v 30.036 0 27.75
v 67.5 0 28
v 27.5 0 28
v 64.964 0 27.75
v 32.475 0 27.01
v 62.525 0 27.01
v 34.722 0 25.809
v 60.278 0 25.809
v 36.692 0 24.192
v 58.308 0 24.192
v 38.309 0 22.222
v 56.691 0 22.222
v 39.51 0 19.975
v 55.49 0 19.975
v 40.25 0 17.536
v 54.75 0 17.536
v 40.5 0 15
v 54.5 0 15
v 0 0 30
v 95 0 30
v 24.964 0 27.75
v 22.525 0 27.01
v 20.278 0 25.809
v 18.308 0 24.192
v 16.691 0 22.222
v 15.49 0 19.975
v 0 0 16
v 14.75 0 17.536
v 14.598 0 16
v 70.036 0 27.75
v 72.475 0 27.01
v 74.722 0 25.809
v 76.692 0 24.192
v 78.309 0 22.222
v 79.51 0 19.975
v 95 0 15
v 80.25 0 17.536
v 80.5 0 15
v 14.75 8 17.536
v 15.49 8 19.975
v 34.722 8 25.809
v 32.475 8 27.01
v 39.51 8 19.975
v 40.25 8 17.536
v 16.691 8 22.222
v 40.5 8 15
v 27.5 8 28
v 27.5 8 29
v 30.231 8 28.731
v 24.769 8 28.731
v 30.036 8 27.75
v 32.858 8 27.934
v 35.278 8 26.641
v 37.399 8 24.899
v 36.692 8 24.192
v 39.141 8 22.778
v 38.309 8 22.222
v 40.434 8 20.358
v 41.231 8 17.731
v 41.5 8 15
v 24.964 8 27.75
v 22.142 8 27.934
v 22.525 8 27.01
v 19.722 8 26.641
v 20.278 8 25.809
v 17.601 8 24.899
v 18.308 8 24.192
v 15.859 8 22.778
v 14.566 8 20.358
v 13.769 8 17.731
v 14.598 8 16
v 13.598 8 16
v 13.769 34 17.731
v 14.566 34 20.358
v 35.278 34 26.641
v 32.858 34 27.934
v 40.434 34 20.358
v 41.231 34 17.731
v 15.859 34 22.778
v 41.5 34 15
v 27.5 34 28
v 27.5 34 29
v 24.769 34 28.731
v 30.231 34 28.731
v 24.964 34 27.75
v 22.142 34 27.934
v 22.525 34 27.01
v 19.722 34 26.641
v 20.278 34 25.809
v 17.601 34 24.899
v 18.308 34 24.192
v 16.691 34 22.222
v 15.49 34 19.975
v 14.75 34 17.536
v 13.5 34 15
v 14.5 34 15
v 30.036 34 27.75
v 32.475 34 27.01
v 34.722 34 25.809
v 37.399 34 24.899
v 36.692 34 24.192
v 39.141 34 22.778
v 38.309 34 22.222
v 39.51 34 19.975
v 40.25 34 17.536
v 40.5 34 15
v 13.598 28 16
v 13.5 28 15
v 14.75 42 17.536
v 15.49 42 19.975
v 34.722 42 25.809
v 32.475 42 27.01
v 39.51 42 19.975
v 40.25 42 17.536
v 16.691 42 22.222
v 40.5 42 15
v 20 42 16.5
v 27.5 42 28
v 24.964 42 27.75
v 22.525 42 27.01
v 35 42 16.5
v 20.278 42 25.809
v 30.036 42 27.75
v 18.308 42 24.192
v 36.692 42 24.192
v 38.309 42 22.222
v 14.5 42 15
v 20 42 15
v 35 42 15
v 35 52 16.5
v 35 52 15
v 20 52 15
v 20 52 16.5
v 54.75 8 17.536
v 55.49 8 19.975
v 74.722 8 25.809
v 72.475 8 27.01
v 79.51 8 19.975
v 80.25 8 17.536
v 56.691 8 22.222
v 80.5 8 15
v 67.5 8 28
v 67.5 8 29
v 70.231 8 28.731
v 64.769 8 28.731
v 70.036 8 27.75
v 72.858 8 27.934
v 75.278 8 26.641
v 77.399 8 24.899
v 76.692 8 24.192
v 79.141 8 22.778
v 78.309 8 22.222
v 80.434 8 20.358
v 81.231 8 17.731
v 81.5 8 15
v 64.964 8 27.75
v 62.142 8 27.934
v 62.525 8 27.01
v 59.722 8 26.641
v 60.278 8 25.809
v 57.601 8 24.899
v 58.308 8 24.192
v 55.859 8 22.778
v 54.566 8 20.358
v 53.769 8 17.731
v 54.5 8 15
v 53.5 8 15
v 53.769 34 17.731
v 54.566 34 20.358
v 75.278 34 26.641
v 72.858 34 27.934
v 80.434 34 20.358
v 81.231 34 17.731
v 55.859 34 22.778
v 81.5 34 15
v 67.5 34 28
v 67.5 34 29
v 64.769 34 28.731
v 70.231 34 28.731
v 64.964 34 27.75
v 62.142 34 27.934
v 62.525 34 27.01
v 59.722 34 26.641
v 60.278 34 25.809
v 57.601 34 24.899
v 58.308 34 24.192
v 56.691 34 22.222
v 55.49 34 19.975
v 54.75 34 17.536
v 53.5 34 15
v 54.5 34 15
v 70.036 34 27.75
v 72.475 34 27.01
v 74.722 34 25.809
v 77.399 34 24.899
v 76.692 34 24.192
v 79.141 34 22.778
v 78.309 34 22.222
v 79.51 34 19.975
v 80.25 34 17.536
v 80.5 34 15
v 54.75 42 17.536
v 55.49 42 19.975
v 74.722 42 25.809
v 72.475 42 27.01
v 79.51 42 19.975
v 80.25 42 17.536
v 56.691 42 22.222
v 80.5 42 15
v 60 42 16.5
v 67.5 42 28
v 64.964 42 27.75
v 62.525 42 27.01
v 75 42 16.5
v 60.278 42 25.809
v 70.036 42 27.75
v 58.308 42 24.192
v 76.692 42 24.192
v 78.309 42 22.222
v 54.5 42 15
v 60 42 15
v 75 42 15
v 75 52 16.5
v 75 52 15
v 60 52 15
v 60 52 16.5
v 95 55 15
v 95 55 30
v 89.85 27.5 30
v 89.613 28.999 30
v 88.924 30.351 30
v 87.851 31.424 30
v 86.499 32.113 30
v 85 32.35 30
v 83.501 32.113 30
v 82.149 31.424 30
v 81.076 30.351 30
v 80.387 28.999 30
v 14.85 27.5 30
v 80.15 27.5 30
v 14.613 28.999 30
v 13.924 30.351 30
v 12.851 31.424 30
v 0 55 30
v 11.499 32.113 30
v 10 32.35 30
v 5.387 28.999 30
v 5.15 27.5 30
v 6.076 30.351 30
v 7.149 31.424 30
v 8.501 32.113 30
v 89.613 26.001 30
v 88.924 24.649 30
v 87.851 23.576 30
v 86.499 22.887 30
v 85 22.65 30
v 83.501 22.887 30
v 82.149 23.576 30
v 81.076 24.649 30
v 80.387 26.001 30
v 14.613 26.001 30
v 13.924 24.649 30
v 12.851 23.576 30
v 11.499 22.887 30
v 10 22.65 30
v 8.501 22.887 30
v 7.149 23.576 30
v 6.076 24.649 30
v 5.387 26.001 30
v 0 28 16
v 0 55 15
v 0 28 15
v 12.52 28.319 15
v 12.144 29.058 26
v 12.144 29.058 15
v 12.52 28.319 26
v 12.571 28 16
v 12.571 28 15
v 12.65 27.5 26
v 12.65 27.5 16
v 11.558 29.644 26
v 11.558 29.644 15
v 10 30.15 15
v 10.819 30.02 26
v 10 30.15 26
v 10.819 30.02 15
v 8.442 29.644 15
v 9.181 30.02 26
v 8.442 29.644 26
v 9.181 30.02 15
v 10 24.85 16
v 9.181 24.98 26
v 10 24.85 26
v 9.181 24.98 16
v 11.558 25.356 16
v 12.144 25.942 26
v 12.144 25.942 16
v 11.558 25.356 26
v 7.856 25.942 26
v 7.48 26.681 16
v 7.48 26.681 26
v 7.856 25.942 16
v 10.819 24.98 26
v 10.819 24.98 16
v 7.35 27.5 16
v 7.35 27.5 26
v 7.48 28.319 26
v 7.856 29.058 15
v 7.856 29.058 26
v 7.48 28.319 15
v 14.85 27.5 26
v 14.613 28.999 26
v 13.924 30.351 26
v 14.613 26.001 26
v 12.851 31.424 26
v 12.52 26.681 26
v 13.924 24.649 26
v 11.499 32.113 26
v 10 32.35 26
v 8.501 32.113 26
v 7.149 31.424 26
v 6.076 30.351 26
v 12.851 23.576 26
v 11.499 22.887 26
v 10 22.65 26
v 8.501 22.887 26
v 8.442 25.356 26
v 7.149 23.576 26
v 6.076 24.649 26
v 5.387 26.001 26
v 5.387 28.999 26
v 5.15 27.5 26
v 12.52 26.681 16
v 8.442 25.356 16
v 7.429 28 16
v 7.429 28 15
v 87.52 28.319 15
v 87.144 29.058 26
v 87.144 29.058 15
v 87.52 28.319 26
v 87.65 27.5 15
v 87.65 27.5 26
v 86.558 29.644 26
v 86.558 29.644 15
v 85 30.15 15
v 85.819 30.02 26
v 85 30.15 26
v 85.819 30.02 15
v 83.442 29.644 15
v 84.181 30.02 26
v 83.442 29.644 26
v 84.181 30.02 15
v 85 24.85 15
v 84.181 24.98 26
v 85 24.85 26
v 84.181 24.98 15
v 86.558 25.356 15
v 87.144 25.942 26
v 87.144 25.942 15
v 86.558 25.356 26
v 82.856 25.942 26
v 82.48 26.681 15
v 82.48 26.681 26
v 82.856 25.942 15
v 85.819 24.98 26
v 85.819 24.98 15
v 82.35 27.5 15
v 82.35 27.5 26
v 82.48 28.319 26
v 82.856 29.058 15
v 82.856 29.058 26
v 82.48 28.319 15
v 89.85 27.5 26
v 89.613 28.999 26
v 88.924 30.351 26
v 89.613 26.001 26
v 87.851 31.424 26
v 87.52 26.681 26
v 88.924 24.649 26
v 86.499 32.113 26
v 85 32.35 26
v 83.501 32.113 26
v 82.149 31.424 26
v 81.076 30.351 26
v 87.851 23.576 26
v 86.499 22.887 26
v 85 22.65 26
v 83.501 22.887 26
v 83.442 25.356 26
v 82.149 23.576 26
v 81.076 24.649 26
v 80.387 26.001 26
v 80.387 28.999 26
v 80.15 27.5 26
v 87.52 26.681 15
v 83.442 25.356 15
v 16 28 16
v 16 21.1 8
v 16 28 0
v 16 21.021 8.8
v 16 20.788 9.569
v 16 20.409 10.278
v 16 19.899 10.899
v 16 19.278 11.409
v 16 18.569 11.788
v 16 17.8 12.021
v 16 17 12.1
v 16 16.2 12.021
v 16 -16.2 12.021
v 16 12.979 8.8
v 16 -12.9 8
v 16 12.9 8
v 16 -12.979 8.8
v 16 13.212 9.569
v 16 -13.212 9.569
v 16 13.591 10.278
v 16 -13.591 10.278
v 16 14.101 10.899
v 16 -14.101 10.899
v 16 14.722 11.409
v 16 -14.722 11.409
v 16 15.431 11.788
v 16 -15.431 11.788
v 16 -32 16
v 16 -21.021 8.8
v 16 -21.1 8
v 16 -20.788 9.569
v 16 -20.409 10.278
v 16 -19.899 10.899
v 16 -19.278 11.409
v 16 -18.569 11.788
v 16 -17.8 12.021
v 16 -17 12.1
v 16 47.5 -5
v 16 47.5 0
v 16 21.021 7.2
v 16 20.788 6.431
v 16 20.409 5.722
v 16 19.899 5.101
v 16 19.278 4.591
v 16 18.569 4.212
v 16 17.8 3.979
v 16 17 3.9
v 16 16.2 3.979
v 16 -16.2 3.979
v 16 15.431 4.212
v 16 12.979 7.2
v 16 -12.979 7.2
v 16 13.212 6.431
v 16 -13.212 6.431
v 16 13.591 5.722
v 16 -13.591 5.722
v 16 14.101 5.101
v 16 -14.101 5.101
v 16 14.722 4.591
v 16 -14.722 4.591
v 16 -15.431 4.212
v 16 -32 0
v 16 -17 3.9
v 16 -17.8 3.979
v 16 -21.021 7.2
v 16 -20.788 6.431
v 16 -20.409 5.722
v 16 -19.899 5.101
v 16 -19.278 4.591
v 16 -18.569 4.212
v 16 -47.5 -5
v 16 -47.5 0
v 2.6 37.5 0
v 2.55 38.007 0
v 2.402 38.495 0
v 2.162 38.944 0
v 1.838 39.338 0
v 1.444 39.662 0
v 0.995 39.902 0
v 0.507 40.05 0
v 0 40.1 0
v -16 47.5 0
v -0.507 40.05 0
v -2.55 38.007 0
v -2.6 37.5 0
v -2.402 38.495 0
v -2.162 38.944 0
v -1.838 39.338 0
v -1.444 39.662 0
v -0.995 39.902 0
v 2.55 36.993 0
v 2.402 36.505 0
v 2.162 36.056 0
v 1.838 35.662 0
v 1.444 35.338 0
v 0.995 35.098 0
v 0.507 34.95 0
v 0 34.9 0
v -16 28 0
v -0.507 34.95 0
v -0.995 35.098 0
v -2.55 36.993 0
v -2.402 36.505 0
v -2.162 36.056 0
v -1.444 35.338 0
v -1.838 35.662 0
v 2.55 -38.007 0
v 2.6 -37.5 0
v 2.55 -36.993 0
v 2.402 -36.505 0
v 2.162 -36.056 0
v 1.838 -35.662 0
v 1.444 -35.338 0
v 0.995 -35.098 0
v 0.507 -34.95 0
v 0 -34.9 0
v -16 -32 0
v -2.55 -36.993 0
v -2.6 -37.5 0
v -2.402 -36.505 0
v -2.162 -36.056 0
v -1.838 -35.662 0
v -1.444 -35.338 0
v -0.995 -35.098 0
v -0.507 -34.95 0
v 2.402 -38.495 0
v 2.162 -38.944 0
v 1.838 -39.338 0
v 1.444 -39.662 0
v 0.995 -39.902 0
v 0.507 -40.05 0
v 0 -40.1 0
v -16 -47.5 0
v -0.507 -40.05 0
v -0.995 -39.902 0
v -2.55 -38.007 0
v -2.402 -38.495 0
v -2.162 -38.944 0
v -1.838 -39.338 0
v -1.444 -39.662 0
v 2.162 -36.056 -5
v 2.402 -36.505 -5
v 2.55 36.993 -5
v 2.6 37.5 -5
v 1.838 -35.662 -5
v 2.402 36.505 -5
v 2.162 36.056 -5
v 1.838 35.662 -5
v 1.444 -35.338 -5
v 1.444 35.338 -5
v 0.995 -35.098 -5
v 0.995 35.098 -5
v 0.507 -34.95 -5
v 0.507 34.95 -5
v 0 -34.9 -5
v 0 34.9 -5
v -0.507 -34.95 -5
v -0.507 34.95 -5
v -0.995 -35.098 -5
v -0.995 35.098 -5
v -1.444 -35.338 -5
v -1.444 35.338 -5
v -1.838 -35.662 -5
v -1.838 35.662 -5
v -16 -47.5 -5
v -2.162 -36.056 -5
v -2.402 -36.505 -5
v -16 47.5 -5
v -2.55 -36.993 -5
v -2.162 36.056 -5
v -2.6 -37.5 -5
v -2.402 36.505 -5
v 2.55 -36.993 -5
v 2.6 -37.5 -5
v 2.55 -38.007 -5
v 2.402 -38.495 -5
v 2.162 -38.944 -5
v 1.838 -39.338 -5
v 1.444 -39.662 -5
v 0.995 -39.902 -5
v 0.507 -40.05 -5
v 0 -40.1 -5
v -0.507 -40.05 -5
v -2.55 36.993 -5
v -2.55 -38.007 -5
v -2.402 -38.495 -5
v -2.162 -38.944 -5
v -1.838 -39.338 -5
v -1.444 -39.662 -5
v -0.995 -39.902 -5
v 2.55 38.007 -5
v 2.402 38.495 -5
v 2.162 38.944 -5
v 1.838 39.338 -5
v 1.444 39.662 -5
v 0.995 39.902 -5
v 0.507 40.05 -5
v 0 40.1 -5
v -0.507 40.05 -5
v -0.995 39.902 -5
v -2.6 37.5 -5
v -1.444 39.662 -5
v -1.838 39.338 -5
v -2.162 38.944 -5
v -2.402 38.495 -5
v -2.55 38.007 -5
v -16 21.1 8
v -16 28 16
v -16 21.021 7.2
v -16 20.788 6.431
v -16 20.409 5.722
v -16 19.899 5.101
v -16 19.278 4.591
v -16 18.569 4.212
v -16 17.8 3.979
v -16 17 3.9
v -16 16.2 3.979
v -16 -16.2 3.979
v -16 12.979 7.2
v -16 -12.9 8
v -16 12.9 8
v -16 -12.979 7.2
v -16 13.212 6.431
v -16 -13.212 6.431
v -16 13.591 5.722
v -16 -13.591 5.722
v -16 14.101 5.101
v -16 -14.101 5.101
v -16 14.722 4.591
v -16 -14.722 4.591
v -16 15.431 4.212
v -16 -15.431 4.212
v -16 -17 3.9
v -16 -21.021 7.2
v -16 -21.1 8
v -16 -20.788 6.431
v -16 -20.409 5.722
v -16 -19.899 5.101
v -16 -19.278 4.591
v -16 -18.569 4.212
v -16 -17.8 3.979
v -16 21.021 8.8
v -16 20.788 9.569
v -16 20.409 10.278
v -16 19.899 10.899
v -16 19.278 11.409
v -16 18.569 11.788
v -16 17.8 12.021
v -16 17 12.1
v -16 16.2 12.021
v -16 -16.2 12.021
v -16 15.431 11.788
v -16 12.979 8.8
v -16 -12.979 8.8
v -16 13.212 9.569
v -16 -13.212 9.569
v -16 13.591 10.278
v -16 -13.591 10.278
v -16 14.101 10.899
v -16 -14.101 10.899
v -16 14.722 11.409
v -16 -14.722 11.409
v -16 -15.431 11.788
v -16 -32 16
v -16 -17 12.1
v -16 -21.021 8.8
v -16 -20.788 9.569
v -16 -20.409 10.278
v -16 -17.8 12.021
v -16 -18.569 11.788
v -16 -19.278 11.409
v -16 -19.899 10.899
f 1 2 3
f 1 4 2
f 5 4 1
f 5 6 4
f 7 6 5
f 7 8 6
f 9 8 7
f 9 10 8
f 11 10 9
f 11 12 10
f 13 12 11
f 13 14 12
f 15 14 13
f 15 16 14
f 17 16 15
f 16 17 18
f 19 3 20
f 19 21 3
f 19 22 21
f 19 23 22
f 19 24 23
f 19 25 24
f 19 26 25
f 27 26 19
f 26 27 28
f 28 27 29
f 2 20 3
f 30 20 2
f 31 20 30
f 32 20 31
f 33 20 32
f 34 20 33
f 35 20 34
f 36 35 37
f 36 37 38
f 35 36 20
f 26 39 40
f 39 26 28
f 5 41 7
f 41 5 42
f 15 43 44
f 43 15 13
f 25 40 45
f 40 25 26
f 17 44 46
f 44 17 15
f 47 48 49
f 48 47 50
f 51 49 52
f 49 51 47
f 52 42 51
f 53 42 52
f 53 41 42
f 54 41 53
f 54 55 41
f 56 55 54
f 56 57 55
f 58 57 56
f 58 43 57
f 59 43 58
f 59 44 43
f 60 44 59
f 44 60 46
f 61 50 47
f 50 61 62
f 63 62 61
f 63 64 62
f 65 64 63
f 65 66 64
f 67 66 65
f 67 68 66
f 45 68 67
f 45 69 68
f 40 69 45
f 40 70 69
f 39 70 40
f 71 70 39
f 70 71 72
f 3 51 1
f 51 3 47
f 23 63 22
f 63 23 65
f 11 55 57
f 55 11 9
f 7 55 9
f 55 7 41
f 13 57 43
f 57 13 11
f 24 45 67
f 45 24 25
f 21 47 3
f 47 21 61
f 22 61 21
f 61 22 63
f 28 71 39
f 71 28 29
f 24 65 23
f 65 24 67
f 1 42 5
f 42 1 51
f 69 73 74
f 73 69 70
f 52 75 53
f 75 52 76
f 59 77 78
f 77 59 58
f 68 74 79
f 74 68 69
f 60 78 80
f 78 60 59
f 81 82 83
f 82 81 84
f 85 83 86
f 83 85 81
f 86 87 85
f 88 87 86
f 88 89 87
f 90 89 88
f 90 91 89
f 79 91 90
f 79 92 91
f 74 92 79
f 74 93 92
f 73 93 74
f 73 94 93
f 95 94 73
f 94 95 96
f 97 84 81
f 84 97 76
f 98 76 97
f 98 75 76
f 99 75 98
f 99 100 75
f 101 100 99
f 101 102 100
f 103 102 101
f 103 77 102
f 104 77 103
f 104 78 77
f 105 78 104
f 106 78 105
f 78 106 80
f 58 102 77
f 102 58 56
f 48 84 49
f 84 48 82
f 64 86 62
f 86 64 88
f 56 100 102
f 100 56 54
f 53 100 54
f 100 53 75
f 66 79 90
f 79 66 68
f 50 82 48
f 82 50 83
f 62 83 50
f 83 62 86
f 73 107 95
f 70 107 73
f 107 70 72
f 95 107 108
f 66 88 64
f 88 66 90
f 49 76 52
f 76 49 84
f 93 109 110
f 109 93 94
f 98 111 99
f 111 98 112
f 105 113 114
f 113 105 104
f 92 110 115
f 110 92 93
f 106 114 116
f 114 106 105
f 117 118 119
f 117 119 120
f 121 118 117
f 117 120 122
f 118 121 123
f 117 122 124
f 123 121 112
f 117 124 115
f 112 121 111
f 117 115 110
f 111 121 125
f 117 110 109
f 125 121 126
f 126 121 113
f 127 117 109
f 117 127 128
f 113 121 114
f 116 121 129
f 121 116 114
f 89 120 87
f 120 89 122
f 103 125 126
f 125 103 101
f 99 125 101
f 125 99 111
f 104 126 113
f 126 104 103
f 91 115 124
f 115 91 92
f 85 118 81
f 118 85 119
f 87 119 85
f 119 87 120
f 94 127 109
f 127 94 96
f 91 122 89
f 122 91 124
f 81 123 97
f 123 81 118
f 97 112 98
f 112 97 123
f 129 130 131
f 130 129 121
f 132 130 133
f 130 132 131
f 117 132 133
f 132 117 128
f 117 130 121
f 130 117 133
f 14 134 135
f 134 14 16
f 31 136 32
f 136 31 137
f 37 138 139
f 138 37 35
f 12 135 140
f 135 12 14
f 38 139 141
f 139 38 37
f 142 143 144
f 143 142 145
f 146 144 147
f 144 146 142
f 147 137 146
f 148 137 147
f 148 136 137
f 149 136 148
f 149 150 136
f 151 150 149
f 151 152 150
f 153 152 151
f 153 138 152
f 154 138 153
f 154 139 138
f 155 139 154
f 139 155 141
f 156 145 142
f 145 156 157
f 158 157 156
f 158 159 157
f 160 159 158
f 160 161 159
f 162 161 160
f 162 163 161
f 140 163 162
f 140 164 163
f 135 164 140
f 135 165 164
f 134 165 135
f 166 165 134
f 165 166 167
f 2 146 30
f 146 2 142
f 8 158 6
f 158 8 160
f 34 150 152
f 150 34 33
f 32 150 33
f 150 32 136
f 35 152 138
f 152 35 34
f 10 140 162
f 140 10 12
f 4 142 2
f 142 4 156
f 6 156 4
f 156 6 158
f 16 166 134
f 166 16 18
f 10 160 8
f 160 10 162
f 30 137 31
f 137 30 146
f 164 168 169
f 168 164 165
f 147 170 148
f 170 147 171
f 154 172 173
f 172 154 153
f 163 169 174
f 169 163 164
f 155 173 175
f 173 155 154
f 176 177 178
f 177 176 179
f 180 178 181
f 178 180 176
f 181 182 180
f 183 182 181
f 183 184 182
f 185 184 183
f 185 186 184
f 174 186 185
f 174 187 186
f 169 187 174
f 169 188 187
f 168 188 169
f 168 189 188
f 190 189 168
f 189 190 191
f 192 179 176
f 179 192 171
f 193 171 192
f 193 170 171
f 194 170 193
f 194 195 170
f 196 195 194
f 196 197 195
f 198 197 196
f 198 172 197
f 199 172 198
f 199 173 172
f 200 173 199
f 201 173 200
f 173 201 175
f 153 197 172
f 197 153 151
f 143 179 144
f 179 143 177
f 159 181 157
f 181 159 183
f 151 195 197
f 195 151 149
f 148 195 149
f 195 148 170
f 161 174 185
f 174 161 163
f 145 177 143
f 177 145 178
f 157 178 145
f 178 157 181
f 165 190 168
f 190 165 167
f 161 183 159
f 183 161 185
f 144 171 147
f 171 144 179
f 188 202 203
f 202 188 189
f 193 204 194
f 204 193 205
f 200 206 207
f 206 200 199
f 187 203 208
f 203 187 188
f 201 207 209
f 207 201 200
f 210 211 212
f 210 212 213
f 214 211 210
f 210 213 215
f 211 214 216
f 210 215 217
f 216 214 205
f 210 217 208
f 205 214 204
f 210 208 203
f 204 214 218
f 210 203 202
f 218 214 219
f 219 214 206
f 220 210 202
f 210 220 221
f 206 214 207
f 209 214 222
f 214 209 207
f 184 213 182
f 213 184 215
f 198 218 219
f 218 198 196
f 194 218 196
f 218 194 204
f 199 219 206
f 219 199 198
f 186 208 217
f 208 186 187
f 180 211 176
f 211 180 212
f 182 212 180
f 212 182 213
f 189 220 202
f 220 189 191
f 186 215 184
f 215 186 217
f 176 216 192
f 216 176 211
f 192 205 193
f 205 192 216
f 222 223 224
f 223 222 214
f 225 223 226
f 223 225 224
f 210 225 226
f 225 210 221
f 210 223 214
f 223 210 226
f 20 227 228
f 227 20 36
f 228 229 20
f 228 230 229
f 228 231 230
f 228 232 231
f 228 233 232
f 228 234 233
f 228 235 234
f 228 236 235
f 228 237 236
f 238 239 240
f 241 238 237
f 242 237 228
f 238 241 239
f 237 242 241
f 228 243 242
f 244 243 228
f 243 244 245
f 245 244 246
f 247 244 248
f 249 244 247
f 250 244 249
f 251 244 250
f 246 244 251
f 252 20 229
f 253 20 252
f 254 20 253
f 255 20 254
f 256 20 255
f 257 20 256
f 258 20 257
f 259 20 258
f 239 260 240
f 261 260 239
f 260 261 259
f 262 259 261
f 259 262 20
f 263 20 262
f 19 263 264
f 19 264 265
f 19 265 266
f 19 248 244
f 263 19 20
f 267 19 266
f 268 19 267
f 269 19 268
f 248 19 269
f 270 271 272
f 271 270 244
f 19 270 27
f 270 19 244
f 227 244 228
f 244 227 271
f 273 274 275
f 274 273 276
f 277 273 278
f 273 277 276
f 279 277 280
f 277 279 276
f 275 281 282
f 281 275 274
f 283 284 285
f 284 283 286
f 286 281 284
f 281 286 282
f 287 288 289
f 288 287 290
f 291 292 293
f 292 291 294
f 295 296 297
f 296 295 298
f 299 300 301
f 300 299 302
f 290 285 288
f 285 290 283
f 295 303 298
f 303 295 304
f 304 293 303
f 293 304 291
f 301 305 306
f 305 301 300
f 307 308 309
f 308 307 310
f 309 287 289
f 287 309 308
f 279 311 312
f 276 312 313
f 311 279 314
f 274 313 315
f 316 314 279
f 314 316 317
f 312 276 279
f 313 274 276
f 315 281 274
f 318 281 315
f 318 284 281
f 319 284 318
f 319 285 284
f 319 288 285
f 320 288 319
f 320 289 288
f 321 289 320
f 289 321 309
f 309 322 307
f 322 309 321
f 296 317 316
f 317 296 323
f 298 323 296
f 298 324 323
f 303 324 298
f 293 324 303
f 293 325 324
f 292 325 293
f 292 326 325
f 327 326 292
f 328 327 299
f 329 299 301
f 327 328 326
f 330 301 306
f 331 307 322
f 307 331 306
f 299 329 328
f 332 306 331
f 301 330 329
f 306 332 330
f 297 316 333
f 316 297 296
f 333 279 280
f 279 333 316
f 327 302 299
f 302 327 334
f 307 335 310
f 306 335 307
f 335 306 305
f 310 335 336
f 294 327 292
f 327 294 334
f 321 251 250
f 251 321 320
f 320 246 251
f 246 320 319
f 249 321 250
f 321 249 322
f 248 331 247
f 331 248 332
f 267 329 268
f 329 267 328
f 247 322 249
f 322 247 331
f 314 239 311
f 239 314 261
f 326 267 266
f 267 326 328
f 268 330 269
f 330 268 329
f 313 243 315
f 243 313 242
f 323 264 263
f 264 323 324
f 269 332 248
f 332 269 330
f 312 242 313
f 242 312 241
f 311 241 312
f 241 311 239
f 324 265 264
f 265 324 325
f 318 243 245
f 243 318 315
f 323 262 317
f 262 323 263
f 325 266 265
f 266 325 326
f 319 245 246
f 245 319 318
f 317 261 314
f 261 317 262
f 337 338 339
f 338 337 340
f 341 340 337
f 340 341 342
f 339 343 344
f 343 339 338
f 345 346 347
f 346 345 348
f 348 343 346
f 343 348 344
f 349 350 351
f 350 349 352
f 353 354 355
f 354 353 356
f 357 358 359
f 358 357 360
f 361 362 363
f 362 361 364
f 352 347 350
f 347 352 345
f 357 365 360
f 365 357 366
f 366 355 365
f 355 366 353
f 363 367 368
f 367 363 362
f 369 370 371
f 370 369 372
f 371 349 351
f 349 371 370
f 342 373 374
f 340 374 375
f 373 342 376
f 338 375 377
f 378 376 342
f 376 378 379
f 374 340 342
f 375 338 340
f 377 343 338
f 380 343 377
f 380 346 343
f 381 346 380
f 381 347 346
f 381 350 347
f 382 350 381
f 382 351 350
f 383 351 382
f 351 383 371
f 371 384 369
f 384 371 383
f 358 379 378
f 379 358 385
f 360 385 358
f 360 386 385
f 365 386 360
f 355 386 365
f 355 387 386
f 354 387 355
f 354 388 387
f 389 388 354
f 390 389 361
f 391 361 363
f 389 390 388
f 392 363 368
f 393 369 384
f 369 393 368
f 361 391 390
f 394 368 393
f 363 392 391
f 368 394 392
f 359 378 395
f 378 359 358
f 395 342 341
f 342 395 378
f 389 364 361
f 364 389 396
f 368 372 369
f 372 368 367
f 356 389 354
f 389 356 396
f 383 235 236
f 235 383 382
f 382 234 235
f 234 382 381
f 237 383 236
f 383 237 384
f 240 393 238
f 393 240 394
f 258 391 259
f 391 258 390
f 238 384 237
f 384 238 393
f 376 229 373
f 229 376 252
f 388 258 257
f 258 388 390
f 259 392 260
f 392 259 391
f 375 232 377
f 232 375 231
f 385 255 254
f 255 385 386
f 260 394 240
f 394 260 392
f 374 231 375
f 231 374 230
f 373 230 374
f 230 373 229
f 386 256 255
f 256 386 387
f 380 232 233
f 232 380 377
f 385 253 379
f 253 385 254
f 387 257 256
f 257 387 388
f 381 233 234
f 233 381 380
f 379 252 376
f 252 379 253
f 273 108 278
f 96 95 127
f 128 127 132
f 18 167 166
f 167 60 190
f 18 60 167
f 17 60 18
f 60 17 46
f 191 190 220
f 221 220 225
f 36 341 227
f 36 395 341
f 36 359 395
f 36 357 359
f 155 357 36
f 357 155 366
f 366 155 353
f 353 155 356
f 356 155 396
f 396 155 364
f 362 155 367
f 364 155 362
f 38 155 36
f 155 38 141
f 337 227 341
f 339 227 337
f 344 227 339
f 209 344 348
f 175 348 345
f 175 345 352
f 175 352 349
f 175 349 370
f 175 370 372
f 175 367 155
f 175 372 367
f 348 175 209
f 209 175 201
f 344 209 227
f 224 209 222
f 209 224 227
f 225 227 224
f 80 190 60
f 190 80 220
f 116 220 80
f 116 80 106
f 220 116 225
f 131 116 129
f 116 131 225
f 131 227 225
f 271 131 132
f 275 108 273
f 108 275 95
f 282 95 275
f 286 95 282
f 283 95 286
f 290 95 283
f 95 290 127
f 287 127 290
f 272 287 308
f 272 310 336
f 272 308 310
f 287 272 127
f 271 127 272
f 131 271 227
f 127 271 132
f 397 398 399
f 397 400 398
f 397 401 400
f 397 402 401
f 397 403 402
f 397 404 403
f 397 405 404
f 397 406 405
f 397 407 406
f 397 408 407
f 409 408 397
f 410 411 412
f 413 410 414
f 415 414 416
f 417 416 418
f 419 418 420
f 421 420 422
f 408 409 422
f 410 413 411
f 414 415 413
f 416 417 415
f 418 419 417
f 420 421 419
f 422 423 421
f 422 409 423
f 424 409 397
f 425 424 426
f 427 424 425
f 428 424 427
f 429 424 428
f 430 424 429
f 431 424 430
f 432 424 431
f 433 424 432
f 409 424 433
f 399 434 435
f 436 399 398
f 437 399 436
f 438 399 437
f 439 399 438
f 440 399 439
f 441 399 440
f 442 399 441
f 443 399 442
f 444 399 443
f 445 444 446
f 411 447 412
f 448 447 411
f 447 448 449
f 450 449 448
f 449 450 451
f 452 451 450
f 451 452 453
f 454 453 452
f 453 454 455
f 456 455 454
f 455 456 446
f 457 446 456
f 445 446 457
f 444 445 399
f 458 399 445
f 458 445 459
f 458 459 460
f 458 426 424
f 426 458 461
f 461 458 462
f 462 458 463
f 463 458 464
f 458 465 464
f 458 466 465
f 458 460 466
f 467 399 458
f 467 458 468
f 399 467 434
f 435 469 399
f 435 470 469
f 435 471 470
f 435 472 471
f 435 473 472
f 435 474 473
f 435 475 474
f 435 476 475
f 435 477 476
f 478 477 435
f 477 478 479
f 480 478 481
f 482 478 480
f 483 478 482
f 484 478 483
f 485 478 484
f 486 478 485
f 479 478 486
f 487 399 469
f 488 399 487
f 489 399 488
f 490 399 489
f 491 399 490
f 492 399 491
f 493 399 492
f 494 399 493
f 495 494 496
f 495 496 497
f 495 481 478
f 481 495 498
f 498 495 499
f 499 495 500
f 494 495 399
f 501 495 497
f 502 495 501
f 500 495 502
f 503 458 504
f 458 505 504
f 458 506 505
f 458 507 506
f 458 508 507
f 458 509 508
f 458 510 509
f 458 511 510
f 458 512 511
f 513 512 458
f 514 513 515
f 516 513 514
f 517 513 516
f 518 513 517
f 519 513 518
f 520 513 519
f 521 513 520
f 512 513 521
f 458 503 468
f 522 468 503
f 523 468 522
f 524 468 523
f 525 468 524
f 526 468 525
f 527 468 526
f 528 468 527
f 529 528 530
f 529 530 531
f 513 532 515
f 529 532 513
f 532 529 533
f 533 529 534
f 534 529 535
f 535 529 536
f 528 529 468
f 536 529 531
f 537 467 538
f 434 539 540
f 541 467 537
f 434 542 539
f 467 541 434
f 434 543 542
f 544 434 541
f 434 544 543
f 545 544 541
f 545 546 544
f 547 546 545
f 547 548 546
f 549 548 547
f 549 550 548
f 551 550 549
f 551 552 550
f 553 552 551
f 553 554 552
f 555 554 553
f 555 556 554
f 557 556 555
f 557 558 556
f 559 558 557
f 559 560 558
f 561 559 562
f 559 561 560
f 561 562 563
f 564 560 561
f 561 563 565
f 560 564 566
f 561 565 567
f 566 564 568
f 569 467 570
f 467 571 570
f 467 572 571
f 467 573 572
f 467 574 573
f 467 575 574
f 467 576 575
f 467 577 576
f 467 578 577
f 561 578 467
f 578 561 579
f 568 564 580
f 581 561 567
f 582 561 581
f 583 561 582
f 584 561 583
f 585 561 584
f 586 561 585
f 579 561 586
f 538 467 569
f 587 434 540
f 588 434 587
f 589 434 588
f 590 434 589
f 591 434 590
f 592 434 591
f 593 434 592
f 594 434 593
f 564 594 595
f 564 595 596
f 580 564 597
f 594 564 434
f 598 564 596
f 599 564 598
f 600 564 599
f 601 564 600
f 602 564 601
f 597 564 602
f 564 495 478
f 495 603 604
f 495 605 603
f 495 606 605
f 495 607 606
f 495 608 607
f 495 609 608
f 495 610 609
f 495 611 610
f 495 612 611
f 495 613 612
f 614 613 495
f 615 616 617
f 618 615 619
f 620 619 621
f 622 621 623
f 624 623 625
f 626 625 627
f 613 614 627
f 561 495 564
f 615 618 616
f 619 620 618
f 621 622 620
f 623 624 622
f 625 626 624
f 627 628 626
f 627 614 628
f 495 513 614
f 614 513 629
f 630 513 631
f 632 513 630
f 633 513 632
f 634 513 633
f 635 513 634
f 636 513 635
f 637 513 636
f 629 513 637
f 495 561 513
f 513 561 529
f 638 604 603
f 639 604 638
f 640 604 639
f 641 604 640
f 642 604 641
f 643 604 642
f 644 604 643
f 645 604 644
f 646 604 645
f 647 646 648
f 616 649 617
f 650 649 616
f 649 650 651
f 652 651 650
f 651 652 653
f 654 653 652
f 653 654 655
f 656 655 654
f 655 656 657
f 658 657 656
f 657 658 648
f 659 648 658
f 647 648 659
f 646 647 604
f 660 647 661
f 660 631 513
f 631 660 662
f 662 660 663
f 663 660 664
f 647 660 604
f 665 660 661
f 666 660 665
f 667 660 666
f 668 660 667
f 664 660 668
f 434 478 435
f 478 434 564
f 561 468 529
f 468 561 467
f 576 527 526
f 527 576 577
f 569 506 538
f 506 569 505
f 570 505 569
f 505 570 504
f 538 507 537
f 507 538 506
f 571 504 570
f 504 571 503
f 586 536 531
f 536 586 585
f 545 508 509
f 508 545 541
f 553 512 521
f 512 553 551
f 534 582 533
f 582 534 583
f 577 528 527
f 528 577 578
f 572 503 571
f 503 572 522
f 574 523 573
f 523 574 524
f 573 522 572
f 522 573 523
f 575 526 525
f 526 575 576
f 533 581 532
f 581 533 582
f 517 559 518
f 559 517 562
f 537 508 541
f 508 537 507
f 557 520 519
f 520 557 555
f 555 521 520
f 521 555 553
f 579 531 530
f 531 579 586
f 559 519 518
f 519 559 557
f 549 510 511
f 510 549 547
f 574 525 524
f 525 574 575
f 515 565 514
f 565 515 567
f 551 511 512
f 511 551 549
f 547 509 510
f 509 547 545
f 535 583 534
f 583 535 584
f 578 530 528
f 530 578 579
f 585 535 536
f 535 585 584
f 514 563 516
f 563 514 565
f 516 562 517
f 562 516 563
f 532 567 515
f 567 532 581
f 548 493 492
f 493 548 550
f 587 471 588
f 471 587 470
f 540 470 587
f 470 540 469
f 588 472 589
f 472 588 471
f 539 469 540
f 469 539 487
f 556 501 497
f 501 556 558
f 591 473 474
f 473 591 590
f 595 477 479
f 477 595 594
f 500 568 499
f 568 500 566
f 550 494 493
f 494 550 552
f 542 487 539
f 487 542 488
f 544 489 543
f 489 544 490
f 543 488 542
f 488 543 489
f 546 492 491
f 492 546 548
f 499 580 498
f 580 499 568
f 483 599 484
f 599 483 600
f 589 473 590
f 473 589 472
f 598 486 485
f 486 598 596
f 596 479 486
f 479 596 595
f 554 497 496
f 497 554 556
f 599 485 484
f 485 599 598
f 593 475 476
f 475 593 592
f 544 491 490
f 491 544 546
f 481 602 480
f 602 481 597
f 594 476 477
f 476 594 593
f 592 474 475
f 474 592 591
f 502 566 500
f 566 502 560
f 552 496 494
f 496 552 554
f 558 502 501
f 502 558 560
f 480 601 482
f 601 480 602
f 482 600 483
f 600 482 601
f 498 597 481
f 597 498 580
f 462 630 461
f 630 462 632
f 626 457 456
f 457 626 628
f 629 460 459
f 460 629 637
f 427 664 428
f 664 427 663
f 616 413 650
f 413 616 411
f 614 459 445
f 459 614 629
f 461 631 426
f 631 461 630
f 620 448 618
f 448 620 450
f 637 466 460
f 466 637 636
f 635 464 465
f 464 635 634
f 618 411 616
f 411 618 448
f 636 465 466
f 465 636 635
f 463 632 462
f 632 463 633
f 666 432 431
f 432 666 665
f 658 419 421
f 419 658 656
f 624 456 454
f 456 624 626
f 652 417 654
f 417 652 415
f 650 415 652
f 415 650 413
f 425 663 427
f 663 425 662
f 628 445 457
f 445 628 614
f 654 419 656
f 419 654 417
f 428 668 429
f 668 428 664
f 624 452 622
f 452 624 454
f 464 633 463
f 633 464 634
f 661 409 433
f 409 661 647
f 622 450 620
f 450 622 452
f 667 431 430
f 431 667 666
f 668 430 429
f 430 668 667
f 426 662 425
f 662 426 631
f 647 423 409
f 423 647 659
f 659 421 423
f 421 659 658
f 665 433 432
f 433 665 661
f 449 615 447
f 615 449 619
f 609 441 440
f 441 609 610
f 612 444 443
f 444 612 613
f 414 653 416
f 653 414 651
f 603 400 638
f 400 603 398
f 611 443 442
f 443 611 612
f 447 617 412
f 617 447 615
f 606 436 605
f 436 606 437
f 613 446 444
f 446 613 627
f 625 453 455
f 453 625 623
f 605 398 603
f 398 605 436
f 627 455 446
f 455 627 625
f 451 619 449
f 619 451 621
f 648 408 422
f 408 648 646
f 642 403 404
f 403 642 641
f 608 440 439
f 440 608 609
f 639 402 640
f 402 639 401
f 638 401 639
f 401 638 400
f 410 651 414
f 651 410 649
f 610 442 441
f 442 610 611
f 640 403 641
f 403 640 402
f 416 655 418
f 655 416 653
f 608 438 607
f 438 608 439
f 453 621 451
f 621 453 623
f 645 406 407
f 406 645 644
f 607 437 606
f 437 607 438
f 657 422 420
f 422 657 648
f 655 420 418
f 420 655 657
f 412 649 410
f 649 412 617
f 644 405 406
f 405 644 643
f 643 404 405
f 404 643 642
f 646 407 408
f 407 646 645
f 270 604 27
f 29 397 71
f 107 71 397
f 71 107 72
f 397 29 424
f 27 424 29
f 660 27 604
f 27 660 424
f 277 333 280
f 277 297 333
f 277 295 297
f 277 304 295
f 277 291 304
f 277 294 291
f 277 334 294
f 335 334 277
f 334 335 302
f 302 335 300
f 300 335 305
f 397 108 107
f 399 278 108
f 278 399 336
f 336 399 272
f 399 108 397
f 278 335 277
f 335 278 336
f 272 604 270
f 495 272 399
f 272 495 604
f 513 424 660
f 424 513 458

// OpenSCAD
// file: common.scad
//GLOBAL VALUES


ear_outer=32; // Outer diameter of each ear
ear_inner=5; // hole for each ear M5

mounting_gap = 6.9; // gap between two ears to mount the light



ear_thick=8;

stacked_len = ear_thick*3;
screw_mount_space = 20;
screw_mount_offset =7;
total_len = stacked_len + screw_mount_space*2;
mounting_diff = 8;

//M3 fastener values

m3_nut_trap_d = 6.7;
m3_nut_thick= 2.4;

m3_bolt_head_d = 5.6;
m3_bolt_thick = 3;

//M5 fastener values

m5_nut_thick = 4;
m5_locknut_thick = 5;
nut_trap_d = 9.7;
bolt_head_d = 8.6;



module bolt_nut(hole_len, bolt_d, flip=false){
    /*
        Create a model for a hole with bolt end on one end and nut hole on the other end.
    Note, this functions doesn't subtract the model it only makes the model
    */
    // currently only implemented for 3mm
    if (flip){
        hole_w_end(hole_len, m3_nut_thick, "hex", bolt_d);
        translate([0,0, hole_len]){
            rotate([180, 0, 0]){
                hole_w_end(hole_len, m3_bolt_thick, "round", bolt_d);
            }
        }
    } else {
        hole_w_end(hole_len, m3_bolt_thick, "round", bolt_d);
        translate([0,0, hole_len]){
            rotate([180, 0, 0]){
                hole_w_end(hole_len, m3_nut_thick, "hex", bolt_d);
            }
        }
    }
}

// More generic functions replacing m5_ hole-making functions
module hole_w_end(hole_len, trap_height, type, bolt_d, flip=false){
    /*
       bolt_d - bolt diameter, i.e. 3, 5 mm
        type -- type of the head hole: 'none', 'hex', 'round
    */
    if (type != "none"){
        cylinder(h=hole_len-trap_height, d=bolt_d, $fn=20);
        if (flip){
            m_recess(trap_height, type, bolt_d);
            translate([0,0,trap_height])
                cylinder(h=hole_len-trap_height, d=bolt_d, $fn=20);

        } else {
                translate([0,0, hole_len - trap_height])
                    m_recess(trap_height, type, bolt_d);
        }
    } else {
        cylinder(h=hole_len, d=bolt_d);
    }
}

module m_recess(height, end_type, bolt_d) {
    // nut/bolt capture hole
    /*
       bolt_d - bolt diameter, i.e. 3, 5 mm
        type -- type of the head hole: 'none', 'hex', 'round
    */
    if (bolt_d >= 3 && bolt_d <= 4){
        //M3
        make_recess(height, end_type, m3_nut_trap_d);
    } else if (bolt_d >= 5 && bolt_d <= 6){
        // M5
        make_recess(height, end_type, nut_trap_d);
    }

}

module make_recess(height, end_type, trap_d){
    rotate([0, 0,90]){
        if (end_type == "hex"){
            cylinder(h=height, d=trap_d, $fn=6);
        } else if (end_type == "round"){
            cylinder(h=height, d=trap_d, $fn=20);
        }
    }
}


//Functions specific to M5 size,
// TODO rewrite as hole_w_end m_recess
module m5_recess(height, end_type) {
    // nut/bolt capture hole
    rotate([0, 0,90]){
        if (end_type == "hex"){
            cylinder(h=height, d=nut_trap_d, $fn=6);
        } else if (end_type == "round"){
            cylinder(h=height, d=nut_trap_d, $fn=20);
        }
    }
}



module m5_hole_w_end(hole_len, trap_height, type){
    //Given hole lenght and trap height create a nut trap hole
    if (type != "none"){
        cylinder(h=hole_len-trap_height, d=5.3, $fn=20); // M5 hole;
            translate([0,0, hole_len-trap_height])
                m5_recess(trap_height, type);
    } else {
        cylinder(h=hole_len, d=5.3); // M5 hole;
    }
}
module m5_hole_w_ends(hole_len, nut_extra=0){
    m5_hole_w_end(hole_len, m5_nut_thick, "round");
    rotate([0, 180, 0])
        translate([0, 0, - hole_len])
            m5_hole_w_end(hole_len, m5_nut_thick + nut_extra, "hex");

}
module set_mounting_hole(x_offset, y_offset, thickness, nut_height, end_type, flip=false){
    /*
    end_type -- end types: - hex, round, none
    */
    translate([x_offset, y_offset, 0]){
        hole_w_end(thickness, nut_height, end_type, 5.3, flip);
    }
}



module mounting_holes_2(fastener_len, nut_height, end_type){
    width_offsetn = 16;
    set_mounting_hole(
        screw_mount_offset,
        width_offset + mounting_diff,
        fastener_len,
        nut_height,
        end_type);

    set_mounting_hole(
        total_len - screw_mount_offset,
        width_offset + mounting_diff,
        fastener_len,
        nut_height,
        end_type);


 }

module mounting_holes(fastener_len, nut_height, end_type, flip=false){
    width_offset = 16;
    // Side towards the beginning
    set_mounting_hole(
        screw_mount_offset,
        width_offset + mounting_diff,
        fastener_len,
        nut_height,
        end_type,
        flip);

    set_mounting_hole(
        screw_mount_offset,
        width_offset - mounting_diff,
        fastener_len,
        nut_height,
        end_type,
        flip);

    // Side towards the end
    set_mounting_hole(
        total_len - screw_mount_offset,
        width_offset + mounting_diff,
        fastener_len,
        nut_height,
        end_type,
        flip);

    set_mounting_hole(
        total_len - screw_mount_offset,
        width_offset - mounting_diff,
        fastener_len,
        nut_height,
        end_type,
        flip);
}
// file: led_tube_mount.scad
include <common.scad>

side_offset = 14;

tolerance = 1;
narrow_bit = 25;
wide_bit_d = 27;
wide_bit_h = 26;
narrow_bit_h = 8;

tube_trap_wired_len = tolerance*3 + wide_bit_h + narrow_bit_h*2;

end_height = 30;
end_width= 65;
end_depth = 65;

led_driver_h = 95;
led_driver_w = 39;

module tube_trap() {
    cylinder(h=narrow_bit_h, d=narrow_bit+tolerance);
    translate([0,0,narrow_bit_h])
        cylinder(h=wide_bit_h, d=wide_bit_d+tolerance);
    translate([0, 0, wide_bit_h+narrow_bit_h])
        cylinder(h=narrow_bit_h, d=narrow_bit + tolerance);
    translate([-15/2, -3/2, wide_bit_h+narrow_bit_h*2])
        cube([15, 3,10]);
}

module led_end_wired(){
    tube_trap();
    //conduit bit
    translate([-22/2, -15+5 ,41]){
        //bump tolerances here
        cube([20+tolerance*4, 15+tolerance*4, 19+tolerance*3]);

    }
}

module punch_led_tube(x_offset, enclosure_height, length){
    translate([x_offset , 0, enclosure_height]){
        rotate([270, 0, 0]){
            cylinder(h=length, d=narrow_bit+tolerance);
        }
    }
}

module punch_led_end(x_offset, enclosure_height, type){
    translate([x_offset , 0, enclosure_height]){
        rotate([270, 0, 0]){
            if (type == "wired"){
                led_end_wired();
                 translate([0, 0, tube_trap_wired_len])
                    cylinder(h=10, d=10);
            } else if (type == "dummy"){
                tube_trap();
            }

         }
    }
}

module wired_catch(end_width, side_offset){
    difference(){
        cube([end_width, end_depth, end_height]);
        punch_led_end(wide_bit_d/2 + side_offset, end_height/2, "wired");
        punch_led_end(
            end_width - wide_bit_d/2 - side_offset,
            end_height/2,
            "wired");
        //first wiring hole
        translate([
            wide_bit_d/2 + side_offset/2+2,
            wide_bit_h+narrow_bit_h*2+9,
            wide_bit_d/2]){
            cube([10, 12 ,50]);
        }
        // second wiring hole
        translate([
            wide_bit_d*2 + 8,
            wide_bit_h+narrow_bit_h*2+9,
            0]){
            cube([10, 12 ,20]);
        }
        // hole for mounting wire
        translate([
            led_driver_h/2,
            end_depth+10,
            5]){
        rotate([45, 0 ,0])
            cylinder(h=50, d=10, $fn=20);
    }
    }


}

module dummy_catch(end_width, side_offset) {
    difference(){
        cube([end_width, end_depth - 10, end_height]);
        punch_led_end(wide_bit_d/2 + side_offset, end_height/2, "dummy");
        punch_led_end(end_width - wide_bit_d/2 - side_offset, end_height/2, "dummy");
    }
}


module make_hole(x_offset, y_offset, hole_len, bolt_d, type, flip){
    translate([x_offset, y_offset, 0])
        if (type == "both"){
            bolt_nut(hole_len, bolt_d, flip);
        } else if (type == "hex"){
            rotate([0, 0, 90])
                hole_w_end(hole_len, m3_nut_thick, "hex", bolt_d, flip);
        } else if (type == "round"){
             hole_w_end(hole_len, m3_nut_thick, "round", bolt_d, flip);
        }
}

module m5_mount_holes(end_depth){
        translate([10, end_depth/2, 0])
            m5_hole_w_end(end_height, m5_nut_thick, "round");
            //m5_hole_w_ends(end_height, nut_extra=5);

        translate([led_driver_h-10, end_depth/2, 0])
            m5_hole_w_end(end_height, m5_nut_thick, "round");
            //m5_hole_w_ends(end_height, nut_extra=5);
}


module build_dummy_side() {
    difference() {
        dummy_catch(led_driver_h, side_offset);
                // Holes to fasten two pieces of the model
        m5_mount_holes(end_depth - 10);
        // for the use with m8_rods_led_short
    }
}

module build_mid_mount(end_width, end_depth, end_height, side_offset) {
    difference(){
        cube([end_width, end_depth, end_height]);
        //cylinder(h=narrow_bit_h, d=narrow_bit+tolerance);
        punch_led_tube(
            wide_bit_d/2 + side_offset,
            end_height/2,
            100);
        punch_led_tube(
            end_width - wide_bit_d/2 - side_offset,
            end_height/2,
            100);
        // Place to mount M8 Rod for supporting leds
        translate([end_width/2, 0, end_height/2]){
            rotate([270, 0, 0]){
                cylinder(h=200, d=8.5);
            }
        }
        // Holes to fasten two pieces of the model
        m5_mount_holes();
    }


}

module set_led_driver_mounts(total_width, total_depth, hole_len){
    bolt_d = 3;
    corner_offset = m3_bolt_thick + 1;

    // Add holes to front corners
    translate([corner_offset, corner_offset, 0]){
        //bolt_nut(hole_len, bolt_d);
        hole_w_end(hole_len, m3_nut_thick, "hex", bolt_d, flip=true);
    }
    translate([total_width - corner_offset, corner_offset, 0]){
        hole_w_end(hole_len, m3_nut_thick, "hex", bolt_d);
    }
    // back corners

    translate([corner_offset, led_driver_w + corner_offset, 0]){
        hole_w_end(hole_len, m3_nut_thick, "hex", bolt_d);
    }
    translate([total_width - corner_offset, led_driver_w + corner_offset, 0]){
        hole_w_end(hole_len, m3_nut_thick, "hex", bolt_d, flip=true);
    }
}

module build_wired_side(){
    difference(){
        wired_catch(led_driver_h, side_offset);
        set_led_driver_mounts(led_driver_h, side_offset, end_height);
    }
}


module simple_wired_side(){
    difference(){
        wired_catch(led_driver_h, side_offset);
        m5_mount_holes();
    }
}

module mid_mount(side){
    difference(){
        build_mid_mount(led_driver_h,end_depth, end_height, side_offset);
        if (side == "bottom"){
            translate([0,0, end_height/2])
                cube([led_driver_h, end_depth, end_height/2]);
        } else if (side == "top") {
            cube([led_driver_h, end_depth, end_height/2]);
        }
    }
}

module mid_mount_winglets(end_depth){
    difference(){
        build_mid_mount(led_driver_h,end_depth, end_height, side_offset);
        translate([0,0, end_height/2])
            cube([led_driver_h, end_depth, end_height/2]);
    }


}

module dummy_mount(side){
    difference(){
        build_dummy_side();
        if (side == "bottom"){
            translate([0,0, end_height/2])
                cube([led_driver_h, end_depth, end_height/2]);
        } else if (side == "top"){
            cube([led_driver_h, end_depth, end_height/2]);
        }
    }
}

module wired_mount(side){
    difference(){
        //build_dummy_side();
        simple_wired_side();
        if (side == "top"){
            cube([led_driver_h, end_depth, end_height/2]);
        }else if (side == "bottom"){
            translate([0,0, end_height/2])
                cube([led_driver_h, end_depth, end_height/2]);
        }
    }
}



// Top level geometry called here

*mid_mount_winglets(12);
dummy_mount("top");
*wired_mount("top");
*mid_mount("bottom");
// main file
//include  <common.scad>;
include <led_tube_mount.scad>;
$fn=32;

//DERIVED GLOBAL VALUES


m5_mount_recess = 2;

module make_ear(ear_len, ear_thick){
    difference() {
        union(){
            translate([0,ear_len,0])
                cylinder(h=ear_thick, d=ear_outer);
            rotate([0, 0,180])
                translate([-ear_outer/2, -ear_len,0])
                    cube([ear_outer, ear_outer-10 + ear_len, ear_thick]);
        }
        translate([0,ear_len,0])
            cylinder(h=ear_thick, d=ear_inner);
    }
}
module ear_with_nut_trap(ear_len, ear_thick){
    //Use 5mm nut trapd
    
    difference(){
        make_ear(ear_len, ear_thick);
        translate([0,ear_len, - m5_mount_recess])
            m5_recess(ear_thick-m5_nut_thick, "hex");
    }
}

module ear_with_round_trap(ear_len, ear_thick){
        difference(){
        make_ear(ear_len, ear_thick);
        translate([0,ear_len, ear_thick - m5_mount_recess])
            m5_recess(ear_thick - m5_nut_thick, "round");
    }
}

module make_ears(ear_len, ear_thick){
    translate([0,0,16]){
        rotate([90, 0, 0]){
            //ear_with_round_trap(ear_len, ear_thick);
            make_ear(ear_len, ear_thick);
            translate([0, 0, -ear_thick - mounting_gap ])
                ear_with_nut_trap(ear_len, ear_thick);
        }
    }
}




module base_and_ears(base_thick, ear_extra_len, nut_height, ear_thick=8){
    /*
    base_tick -- given base thickness
    ear_extra_len -- ear length(reach) 
    nut_height -- M5 nut height (for regular, locknut, cap)
    ear_thickness -- ear thickness 8mm default
    build base with ears for mount
    
    sample params base_thick=15, ear_extra_len 5, nut_height=5
    */
   
    // Base and ears
    union() {
    translate([0, ear_thick, base_thick])
        make_ears(ear_extra_len, ear_thick);
    translate([ ear_outer/2, -screw_mount_space, 0])
        rotate([0, 0, 90]){
            difference(){
                cube([total_len, ear_outer, base_thick]);
                mounting_holes(base_thick, nut_height, end_type="round");
            }
            
        }
    }
}

module single_ear(base_thick, ear_extra_len, nut_height, ear_thick){
    translate([0,ear_thick/2,ear_extra_len+ ear_outer/2+ear_reach*2])
        rotate([90, 0, 0])
            make_ear(ear_extra_len, ear_thick);

}
module make_base_m3(width, depth, height){
    translate([-width/2, -depth/2, -height]){
        difference(){
            cube([width, depth, height]);
            dummy_side_mounts(width, depth, 5, "round", center_hole=false, side_holes=false);
        }
    }
}



module make_base_m5(width, depth, height, base_thick){
    //echo(total_len);
    translate([ -total_len/2, -ear_outer/2, 0])
        rotate([0, 0, 0]){
            difference(){
                cube([total_len, ear_outer, base_thick]);
                    set_mounting_hole(6, ear_outer/2, 10, 5, end_type="hex");
                    set_mounting_hole(total_len - 6, ear_outer/2, 10, 5, end_type="hex");
                        
            }
            
        }
    }

// Code related to LED T8 tube mount
module make_base_led_mid_m5(width, depth, height){
    translate([-width/2, -depth/2, -height]){
        difference(){
            cube([width, depth, height]);
            translate([width/2,10 , 0])
                cylinder(d=5.2, h=height);
            translate([width/2, depth-10, 0])
                cylinder(d=5.2, h=height);
                //m5_hole_w_ends(end_height, nut_extra=5);
            
        }
    }
}

module m5_ear_correct_orientation(){
    single_ear(base_thickness, ear_reach, m3_nut_thick, 6);
    rotate([0,0,90])
        make_base_led_mid_m5(end_width, led_driver_h, 5);
}


module m8_rods_led(base_thick, base_len){
    make_base_led_mid_m5(end_width, led_driver_h, 5);
    translate([-ear_outer/2, -total_len/2, 0]){
        difference(){
            cube([ear_outer, total_len, base_thick]);
            translate([40, 0, 0])
                dual_m8_rod_cutout(base_thick);
        }
    }
}


module m8_rods_led_short(base_thick){
    make_base_led_mid_m5(total_len/2, led_driver_h, 5);
    translate([-ear_outer/2, -total_len/2, 0]){
        difference(){
            cube([ear_outer, total_len - 4, base_thick]);
            translate([40, 0, 0])
                dual_m8_rod_cutout(base_thick);
        }
    }
}
// code related to dual overhead rod mount

module m8_rod_mount_center(base_thick, ear_extra_len, nut_height, ear_thick=8){
    //mount m8 rod through an non-articulating mount
    
        translate([ ear_outer/2, -screw_mount_space, 0])
            difference(){
                rotate([0, 0, 90]){
                    difference(){
                        cube([total_len, ear_outer, base_thick]);
                        mounting_holes(base_thick, nut_height, end_type="round");
                        }
                    }
            translate([-50, (total_len/2), base_thick/2])
                rotate([0, 90, 0])
                    cylinder(d=8.2, h=50);
            }
        
}

module dual_m8_rod_cutout(base_thick){
    translate([-50, 15, base_thick/2])
        rotate([0, 90, 0])
            cylinder(d=8.2, h=50);
    /*
     * total_len - 15 = 49
     * gap between rods is 49 - 15 = 34mm
     */
    translate([-50, total_len-15, base_thick/2])
        rotate([0, 90, 0])
            cylinder(d=8.2, h=50);
}

module m8_rods_mount(base_thick, ear_extra_len, nut_height, ear_thick=8){
    //mount m8 rod through an non-articulating mount
    
    translate([ ear_outer/2, -screw_mount_space, 0])
        difference(){
            rotate([0, 0, 90]){
                difference(){
                    cube([total_len, ear_outer, base_thick]);
                    mounting_holes(base_thick, nut_height, end_type="round");
                    }
                }
            dual_m8_rod_cutout(base_thick);
        }
}





base_thickness = 8;
ear_reach = 2;


//m5_ear_correct_orientation();
// Mounting gap for the new single-ear setup (old 6.9mm)
mounting_gap = 8;

// Default setup
//base_and_ears(base_thickness, ear_reach, m5_nut_thick);

// M8 mount

*m8_rods_mount(8*2, ear_reach, m5_nut_thick);
*m8_rods_led(8*2);
m8_rods_led_short(8*2);
//make_base_m3(end_width, led_driver_h, 5);

    
// single mount
/*
single_ear(base_thickness, ear_reach, m5_nut_thick, 6);
translate([0,0,-7])
make_base_m5(base_thickness, ear_reach, m5_nut_thick, 8);
*/
//make_base_m5(base_thickness, ear_reach, m5_nut_thick, 8);
// led mounts
*m5_ear_correct_orientation();
